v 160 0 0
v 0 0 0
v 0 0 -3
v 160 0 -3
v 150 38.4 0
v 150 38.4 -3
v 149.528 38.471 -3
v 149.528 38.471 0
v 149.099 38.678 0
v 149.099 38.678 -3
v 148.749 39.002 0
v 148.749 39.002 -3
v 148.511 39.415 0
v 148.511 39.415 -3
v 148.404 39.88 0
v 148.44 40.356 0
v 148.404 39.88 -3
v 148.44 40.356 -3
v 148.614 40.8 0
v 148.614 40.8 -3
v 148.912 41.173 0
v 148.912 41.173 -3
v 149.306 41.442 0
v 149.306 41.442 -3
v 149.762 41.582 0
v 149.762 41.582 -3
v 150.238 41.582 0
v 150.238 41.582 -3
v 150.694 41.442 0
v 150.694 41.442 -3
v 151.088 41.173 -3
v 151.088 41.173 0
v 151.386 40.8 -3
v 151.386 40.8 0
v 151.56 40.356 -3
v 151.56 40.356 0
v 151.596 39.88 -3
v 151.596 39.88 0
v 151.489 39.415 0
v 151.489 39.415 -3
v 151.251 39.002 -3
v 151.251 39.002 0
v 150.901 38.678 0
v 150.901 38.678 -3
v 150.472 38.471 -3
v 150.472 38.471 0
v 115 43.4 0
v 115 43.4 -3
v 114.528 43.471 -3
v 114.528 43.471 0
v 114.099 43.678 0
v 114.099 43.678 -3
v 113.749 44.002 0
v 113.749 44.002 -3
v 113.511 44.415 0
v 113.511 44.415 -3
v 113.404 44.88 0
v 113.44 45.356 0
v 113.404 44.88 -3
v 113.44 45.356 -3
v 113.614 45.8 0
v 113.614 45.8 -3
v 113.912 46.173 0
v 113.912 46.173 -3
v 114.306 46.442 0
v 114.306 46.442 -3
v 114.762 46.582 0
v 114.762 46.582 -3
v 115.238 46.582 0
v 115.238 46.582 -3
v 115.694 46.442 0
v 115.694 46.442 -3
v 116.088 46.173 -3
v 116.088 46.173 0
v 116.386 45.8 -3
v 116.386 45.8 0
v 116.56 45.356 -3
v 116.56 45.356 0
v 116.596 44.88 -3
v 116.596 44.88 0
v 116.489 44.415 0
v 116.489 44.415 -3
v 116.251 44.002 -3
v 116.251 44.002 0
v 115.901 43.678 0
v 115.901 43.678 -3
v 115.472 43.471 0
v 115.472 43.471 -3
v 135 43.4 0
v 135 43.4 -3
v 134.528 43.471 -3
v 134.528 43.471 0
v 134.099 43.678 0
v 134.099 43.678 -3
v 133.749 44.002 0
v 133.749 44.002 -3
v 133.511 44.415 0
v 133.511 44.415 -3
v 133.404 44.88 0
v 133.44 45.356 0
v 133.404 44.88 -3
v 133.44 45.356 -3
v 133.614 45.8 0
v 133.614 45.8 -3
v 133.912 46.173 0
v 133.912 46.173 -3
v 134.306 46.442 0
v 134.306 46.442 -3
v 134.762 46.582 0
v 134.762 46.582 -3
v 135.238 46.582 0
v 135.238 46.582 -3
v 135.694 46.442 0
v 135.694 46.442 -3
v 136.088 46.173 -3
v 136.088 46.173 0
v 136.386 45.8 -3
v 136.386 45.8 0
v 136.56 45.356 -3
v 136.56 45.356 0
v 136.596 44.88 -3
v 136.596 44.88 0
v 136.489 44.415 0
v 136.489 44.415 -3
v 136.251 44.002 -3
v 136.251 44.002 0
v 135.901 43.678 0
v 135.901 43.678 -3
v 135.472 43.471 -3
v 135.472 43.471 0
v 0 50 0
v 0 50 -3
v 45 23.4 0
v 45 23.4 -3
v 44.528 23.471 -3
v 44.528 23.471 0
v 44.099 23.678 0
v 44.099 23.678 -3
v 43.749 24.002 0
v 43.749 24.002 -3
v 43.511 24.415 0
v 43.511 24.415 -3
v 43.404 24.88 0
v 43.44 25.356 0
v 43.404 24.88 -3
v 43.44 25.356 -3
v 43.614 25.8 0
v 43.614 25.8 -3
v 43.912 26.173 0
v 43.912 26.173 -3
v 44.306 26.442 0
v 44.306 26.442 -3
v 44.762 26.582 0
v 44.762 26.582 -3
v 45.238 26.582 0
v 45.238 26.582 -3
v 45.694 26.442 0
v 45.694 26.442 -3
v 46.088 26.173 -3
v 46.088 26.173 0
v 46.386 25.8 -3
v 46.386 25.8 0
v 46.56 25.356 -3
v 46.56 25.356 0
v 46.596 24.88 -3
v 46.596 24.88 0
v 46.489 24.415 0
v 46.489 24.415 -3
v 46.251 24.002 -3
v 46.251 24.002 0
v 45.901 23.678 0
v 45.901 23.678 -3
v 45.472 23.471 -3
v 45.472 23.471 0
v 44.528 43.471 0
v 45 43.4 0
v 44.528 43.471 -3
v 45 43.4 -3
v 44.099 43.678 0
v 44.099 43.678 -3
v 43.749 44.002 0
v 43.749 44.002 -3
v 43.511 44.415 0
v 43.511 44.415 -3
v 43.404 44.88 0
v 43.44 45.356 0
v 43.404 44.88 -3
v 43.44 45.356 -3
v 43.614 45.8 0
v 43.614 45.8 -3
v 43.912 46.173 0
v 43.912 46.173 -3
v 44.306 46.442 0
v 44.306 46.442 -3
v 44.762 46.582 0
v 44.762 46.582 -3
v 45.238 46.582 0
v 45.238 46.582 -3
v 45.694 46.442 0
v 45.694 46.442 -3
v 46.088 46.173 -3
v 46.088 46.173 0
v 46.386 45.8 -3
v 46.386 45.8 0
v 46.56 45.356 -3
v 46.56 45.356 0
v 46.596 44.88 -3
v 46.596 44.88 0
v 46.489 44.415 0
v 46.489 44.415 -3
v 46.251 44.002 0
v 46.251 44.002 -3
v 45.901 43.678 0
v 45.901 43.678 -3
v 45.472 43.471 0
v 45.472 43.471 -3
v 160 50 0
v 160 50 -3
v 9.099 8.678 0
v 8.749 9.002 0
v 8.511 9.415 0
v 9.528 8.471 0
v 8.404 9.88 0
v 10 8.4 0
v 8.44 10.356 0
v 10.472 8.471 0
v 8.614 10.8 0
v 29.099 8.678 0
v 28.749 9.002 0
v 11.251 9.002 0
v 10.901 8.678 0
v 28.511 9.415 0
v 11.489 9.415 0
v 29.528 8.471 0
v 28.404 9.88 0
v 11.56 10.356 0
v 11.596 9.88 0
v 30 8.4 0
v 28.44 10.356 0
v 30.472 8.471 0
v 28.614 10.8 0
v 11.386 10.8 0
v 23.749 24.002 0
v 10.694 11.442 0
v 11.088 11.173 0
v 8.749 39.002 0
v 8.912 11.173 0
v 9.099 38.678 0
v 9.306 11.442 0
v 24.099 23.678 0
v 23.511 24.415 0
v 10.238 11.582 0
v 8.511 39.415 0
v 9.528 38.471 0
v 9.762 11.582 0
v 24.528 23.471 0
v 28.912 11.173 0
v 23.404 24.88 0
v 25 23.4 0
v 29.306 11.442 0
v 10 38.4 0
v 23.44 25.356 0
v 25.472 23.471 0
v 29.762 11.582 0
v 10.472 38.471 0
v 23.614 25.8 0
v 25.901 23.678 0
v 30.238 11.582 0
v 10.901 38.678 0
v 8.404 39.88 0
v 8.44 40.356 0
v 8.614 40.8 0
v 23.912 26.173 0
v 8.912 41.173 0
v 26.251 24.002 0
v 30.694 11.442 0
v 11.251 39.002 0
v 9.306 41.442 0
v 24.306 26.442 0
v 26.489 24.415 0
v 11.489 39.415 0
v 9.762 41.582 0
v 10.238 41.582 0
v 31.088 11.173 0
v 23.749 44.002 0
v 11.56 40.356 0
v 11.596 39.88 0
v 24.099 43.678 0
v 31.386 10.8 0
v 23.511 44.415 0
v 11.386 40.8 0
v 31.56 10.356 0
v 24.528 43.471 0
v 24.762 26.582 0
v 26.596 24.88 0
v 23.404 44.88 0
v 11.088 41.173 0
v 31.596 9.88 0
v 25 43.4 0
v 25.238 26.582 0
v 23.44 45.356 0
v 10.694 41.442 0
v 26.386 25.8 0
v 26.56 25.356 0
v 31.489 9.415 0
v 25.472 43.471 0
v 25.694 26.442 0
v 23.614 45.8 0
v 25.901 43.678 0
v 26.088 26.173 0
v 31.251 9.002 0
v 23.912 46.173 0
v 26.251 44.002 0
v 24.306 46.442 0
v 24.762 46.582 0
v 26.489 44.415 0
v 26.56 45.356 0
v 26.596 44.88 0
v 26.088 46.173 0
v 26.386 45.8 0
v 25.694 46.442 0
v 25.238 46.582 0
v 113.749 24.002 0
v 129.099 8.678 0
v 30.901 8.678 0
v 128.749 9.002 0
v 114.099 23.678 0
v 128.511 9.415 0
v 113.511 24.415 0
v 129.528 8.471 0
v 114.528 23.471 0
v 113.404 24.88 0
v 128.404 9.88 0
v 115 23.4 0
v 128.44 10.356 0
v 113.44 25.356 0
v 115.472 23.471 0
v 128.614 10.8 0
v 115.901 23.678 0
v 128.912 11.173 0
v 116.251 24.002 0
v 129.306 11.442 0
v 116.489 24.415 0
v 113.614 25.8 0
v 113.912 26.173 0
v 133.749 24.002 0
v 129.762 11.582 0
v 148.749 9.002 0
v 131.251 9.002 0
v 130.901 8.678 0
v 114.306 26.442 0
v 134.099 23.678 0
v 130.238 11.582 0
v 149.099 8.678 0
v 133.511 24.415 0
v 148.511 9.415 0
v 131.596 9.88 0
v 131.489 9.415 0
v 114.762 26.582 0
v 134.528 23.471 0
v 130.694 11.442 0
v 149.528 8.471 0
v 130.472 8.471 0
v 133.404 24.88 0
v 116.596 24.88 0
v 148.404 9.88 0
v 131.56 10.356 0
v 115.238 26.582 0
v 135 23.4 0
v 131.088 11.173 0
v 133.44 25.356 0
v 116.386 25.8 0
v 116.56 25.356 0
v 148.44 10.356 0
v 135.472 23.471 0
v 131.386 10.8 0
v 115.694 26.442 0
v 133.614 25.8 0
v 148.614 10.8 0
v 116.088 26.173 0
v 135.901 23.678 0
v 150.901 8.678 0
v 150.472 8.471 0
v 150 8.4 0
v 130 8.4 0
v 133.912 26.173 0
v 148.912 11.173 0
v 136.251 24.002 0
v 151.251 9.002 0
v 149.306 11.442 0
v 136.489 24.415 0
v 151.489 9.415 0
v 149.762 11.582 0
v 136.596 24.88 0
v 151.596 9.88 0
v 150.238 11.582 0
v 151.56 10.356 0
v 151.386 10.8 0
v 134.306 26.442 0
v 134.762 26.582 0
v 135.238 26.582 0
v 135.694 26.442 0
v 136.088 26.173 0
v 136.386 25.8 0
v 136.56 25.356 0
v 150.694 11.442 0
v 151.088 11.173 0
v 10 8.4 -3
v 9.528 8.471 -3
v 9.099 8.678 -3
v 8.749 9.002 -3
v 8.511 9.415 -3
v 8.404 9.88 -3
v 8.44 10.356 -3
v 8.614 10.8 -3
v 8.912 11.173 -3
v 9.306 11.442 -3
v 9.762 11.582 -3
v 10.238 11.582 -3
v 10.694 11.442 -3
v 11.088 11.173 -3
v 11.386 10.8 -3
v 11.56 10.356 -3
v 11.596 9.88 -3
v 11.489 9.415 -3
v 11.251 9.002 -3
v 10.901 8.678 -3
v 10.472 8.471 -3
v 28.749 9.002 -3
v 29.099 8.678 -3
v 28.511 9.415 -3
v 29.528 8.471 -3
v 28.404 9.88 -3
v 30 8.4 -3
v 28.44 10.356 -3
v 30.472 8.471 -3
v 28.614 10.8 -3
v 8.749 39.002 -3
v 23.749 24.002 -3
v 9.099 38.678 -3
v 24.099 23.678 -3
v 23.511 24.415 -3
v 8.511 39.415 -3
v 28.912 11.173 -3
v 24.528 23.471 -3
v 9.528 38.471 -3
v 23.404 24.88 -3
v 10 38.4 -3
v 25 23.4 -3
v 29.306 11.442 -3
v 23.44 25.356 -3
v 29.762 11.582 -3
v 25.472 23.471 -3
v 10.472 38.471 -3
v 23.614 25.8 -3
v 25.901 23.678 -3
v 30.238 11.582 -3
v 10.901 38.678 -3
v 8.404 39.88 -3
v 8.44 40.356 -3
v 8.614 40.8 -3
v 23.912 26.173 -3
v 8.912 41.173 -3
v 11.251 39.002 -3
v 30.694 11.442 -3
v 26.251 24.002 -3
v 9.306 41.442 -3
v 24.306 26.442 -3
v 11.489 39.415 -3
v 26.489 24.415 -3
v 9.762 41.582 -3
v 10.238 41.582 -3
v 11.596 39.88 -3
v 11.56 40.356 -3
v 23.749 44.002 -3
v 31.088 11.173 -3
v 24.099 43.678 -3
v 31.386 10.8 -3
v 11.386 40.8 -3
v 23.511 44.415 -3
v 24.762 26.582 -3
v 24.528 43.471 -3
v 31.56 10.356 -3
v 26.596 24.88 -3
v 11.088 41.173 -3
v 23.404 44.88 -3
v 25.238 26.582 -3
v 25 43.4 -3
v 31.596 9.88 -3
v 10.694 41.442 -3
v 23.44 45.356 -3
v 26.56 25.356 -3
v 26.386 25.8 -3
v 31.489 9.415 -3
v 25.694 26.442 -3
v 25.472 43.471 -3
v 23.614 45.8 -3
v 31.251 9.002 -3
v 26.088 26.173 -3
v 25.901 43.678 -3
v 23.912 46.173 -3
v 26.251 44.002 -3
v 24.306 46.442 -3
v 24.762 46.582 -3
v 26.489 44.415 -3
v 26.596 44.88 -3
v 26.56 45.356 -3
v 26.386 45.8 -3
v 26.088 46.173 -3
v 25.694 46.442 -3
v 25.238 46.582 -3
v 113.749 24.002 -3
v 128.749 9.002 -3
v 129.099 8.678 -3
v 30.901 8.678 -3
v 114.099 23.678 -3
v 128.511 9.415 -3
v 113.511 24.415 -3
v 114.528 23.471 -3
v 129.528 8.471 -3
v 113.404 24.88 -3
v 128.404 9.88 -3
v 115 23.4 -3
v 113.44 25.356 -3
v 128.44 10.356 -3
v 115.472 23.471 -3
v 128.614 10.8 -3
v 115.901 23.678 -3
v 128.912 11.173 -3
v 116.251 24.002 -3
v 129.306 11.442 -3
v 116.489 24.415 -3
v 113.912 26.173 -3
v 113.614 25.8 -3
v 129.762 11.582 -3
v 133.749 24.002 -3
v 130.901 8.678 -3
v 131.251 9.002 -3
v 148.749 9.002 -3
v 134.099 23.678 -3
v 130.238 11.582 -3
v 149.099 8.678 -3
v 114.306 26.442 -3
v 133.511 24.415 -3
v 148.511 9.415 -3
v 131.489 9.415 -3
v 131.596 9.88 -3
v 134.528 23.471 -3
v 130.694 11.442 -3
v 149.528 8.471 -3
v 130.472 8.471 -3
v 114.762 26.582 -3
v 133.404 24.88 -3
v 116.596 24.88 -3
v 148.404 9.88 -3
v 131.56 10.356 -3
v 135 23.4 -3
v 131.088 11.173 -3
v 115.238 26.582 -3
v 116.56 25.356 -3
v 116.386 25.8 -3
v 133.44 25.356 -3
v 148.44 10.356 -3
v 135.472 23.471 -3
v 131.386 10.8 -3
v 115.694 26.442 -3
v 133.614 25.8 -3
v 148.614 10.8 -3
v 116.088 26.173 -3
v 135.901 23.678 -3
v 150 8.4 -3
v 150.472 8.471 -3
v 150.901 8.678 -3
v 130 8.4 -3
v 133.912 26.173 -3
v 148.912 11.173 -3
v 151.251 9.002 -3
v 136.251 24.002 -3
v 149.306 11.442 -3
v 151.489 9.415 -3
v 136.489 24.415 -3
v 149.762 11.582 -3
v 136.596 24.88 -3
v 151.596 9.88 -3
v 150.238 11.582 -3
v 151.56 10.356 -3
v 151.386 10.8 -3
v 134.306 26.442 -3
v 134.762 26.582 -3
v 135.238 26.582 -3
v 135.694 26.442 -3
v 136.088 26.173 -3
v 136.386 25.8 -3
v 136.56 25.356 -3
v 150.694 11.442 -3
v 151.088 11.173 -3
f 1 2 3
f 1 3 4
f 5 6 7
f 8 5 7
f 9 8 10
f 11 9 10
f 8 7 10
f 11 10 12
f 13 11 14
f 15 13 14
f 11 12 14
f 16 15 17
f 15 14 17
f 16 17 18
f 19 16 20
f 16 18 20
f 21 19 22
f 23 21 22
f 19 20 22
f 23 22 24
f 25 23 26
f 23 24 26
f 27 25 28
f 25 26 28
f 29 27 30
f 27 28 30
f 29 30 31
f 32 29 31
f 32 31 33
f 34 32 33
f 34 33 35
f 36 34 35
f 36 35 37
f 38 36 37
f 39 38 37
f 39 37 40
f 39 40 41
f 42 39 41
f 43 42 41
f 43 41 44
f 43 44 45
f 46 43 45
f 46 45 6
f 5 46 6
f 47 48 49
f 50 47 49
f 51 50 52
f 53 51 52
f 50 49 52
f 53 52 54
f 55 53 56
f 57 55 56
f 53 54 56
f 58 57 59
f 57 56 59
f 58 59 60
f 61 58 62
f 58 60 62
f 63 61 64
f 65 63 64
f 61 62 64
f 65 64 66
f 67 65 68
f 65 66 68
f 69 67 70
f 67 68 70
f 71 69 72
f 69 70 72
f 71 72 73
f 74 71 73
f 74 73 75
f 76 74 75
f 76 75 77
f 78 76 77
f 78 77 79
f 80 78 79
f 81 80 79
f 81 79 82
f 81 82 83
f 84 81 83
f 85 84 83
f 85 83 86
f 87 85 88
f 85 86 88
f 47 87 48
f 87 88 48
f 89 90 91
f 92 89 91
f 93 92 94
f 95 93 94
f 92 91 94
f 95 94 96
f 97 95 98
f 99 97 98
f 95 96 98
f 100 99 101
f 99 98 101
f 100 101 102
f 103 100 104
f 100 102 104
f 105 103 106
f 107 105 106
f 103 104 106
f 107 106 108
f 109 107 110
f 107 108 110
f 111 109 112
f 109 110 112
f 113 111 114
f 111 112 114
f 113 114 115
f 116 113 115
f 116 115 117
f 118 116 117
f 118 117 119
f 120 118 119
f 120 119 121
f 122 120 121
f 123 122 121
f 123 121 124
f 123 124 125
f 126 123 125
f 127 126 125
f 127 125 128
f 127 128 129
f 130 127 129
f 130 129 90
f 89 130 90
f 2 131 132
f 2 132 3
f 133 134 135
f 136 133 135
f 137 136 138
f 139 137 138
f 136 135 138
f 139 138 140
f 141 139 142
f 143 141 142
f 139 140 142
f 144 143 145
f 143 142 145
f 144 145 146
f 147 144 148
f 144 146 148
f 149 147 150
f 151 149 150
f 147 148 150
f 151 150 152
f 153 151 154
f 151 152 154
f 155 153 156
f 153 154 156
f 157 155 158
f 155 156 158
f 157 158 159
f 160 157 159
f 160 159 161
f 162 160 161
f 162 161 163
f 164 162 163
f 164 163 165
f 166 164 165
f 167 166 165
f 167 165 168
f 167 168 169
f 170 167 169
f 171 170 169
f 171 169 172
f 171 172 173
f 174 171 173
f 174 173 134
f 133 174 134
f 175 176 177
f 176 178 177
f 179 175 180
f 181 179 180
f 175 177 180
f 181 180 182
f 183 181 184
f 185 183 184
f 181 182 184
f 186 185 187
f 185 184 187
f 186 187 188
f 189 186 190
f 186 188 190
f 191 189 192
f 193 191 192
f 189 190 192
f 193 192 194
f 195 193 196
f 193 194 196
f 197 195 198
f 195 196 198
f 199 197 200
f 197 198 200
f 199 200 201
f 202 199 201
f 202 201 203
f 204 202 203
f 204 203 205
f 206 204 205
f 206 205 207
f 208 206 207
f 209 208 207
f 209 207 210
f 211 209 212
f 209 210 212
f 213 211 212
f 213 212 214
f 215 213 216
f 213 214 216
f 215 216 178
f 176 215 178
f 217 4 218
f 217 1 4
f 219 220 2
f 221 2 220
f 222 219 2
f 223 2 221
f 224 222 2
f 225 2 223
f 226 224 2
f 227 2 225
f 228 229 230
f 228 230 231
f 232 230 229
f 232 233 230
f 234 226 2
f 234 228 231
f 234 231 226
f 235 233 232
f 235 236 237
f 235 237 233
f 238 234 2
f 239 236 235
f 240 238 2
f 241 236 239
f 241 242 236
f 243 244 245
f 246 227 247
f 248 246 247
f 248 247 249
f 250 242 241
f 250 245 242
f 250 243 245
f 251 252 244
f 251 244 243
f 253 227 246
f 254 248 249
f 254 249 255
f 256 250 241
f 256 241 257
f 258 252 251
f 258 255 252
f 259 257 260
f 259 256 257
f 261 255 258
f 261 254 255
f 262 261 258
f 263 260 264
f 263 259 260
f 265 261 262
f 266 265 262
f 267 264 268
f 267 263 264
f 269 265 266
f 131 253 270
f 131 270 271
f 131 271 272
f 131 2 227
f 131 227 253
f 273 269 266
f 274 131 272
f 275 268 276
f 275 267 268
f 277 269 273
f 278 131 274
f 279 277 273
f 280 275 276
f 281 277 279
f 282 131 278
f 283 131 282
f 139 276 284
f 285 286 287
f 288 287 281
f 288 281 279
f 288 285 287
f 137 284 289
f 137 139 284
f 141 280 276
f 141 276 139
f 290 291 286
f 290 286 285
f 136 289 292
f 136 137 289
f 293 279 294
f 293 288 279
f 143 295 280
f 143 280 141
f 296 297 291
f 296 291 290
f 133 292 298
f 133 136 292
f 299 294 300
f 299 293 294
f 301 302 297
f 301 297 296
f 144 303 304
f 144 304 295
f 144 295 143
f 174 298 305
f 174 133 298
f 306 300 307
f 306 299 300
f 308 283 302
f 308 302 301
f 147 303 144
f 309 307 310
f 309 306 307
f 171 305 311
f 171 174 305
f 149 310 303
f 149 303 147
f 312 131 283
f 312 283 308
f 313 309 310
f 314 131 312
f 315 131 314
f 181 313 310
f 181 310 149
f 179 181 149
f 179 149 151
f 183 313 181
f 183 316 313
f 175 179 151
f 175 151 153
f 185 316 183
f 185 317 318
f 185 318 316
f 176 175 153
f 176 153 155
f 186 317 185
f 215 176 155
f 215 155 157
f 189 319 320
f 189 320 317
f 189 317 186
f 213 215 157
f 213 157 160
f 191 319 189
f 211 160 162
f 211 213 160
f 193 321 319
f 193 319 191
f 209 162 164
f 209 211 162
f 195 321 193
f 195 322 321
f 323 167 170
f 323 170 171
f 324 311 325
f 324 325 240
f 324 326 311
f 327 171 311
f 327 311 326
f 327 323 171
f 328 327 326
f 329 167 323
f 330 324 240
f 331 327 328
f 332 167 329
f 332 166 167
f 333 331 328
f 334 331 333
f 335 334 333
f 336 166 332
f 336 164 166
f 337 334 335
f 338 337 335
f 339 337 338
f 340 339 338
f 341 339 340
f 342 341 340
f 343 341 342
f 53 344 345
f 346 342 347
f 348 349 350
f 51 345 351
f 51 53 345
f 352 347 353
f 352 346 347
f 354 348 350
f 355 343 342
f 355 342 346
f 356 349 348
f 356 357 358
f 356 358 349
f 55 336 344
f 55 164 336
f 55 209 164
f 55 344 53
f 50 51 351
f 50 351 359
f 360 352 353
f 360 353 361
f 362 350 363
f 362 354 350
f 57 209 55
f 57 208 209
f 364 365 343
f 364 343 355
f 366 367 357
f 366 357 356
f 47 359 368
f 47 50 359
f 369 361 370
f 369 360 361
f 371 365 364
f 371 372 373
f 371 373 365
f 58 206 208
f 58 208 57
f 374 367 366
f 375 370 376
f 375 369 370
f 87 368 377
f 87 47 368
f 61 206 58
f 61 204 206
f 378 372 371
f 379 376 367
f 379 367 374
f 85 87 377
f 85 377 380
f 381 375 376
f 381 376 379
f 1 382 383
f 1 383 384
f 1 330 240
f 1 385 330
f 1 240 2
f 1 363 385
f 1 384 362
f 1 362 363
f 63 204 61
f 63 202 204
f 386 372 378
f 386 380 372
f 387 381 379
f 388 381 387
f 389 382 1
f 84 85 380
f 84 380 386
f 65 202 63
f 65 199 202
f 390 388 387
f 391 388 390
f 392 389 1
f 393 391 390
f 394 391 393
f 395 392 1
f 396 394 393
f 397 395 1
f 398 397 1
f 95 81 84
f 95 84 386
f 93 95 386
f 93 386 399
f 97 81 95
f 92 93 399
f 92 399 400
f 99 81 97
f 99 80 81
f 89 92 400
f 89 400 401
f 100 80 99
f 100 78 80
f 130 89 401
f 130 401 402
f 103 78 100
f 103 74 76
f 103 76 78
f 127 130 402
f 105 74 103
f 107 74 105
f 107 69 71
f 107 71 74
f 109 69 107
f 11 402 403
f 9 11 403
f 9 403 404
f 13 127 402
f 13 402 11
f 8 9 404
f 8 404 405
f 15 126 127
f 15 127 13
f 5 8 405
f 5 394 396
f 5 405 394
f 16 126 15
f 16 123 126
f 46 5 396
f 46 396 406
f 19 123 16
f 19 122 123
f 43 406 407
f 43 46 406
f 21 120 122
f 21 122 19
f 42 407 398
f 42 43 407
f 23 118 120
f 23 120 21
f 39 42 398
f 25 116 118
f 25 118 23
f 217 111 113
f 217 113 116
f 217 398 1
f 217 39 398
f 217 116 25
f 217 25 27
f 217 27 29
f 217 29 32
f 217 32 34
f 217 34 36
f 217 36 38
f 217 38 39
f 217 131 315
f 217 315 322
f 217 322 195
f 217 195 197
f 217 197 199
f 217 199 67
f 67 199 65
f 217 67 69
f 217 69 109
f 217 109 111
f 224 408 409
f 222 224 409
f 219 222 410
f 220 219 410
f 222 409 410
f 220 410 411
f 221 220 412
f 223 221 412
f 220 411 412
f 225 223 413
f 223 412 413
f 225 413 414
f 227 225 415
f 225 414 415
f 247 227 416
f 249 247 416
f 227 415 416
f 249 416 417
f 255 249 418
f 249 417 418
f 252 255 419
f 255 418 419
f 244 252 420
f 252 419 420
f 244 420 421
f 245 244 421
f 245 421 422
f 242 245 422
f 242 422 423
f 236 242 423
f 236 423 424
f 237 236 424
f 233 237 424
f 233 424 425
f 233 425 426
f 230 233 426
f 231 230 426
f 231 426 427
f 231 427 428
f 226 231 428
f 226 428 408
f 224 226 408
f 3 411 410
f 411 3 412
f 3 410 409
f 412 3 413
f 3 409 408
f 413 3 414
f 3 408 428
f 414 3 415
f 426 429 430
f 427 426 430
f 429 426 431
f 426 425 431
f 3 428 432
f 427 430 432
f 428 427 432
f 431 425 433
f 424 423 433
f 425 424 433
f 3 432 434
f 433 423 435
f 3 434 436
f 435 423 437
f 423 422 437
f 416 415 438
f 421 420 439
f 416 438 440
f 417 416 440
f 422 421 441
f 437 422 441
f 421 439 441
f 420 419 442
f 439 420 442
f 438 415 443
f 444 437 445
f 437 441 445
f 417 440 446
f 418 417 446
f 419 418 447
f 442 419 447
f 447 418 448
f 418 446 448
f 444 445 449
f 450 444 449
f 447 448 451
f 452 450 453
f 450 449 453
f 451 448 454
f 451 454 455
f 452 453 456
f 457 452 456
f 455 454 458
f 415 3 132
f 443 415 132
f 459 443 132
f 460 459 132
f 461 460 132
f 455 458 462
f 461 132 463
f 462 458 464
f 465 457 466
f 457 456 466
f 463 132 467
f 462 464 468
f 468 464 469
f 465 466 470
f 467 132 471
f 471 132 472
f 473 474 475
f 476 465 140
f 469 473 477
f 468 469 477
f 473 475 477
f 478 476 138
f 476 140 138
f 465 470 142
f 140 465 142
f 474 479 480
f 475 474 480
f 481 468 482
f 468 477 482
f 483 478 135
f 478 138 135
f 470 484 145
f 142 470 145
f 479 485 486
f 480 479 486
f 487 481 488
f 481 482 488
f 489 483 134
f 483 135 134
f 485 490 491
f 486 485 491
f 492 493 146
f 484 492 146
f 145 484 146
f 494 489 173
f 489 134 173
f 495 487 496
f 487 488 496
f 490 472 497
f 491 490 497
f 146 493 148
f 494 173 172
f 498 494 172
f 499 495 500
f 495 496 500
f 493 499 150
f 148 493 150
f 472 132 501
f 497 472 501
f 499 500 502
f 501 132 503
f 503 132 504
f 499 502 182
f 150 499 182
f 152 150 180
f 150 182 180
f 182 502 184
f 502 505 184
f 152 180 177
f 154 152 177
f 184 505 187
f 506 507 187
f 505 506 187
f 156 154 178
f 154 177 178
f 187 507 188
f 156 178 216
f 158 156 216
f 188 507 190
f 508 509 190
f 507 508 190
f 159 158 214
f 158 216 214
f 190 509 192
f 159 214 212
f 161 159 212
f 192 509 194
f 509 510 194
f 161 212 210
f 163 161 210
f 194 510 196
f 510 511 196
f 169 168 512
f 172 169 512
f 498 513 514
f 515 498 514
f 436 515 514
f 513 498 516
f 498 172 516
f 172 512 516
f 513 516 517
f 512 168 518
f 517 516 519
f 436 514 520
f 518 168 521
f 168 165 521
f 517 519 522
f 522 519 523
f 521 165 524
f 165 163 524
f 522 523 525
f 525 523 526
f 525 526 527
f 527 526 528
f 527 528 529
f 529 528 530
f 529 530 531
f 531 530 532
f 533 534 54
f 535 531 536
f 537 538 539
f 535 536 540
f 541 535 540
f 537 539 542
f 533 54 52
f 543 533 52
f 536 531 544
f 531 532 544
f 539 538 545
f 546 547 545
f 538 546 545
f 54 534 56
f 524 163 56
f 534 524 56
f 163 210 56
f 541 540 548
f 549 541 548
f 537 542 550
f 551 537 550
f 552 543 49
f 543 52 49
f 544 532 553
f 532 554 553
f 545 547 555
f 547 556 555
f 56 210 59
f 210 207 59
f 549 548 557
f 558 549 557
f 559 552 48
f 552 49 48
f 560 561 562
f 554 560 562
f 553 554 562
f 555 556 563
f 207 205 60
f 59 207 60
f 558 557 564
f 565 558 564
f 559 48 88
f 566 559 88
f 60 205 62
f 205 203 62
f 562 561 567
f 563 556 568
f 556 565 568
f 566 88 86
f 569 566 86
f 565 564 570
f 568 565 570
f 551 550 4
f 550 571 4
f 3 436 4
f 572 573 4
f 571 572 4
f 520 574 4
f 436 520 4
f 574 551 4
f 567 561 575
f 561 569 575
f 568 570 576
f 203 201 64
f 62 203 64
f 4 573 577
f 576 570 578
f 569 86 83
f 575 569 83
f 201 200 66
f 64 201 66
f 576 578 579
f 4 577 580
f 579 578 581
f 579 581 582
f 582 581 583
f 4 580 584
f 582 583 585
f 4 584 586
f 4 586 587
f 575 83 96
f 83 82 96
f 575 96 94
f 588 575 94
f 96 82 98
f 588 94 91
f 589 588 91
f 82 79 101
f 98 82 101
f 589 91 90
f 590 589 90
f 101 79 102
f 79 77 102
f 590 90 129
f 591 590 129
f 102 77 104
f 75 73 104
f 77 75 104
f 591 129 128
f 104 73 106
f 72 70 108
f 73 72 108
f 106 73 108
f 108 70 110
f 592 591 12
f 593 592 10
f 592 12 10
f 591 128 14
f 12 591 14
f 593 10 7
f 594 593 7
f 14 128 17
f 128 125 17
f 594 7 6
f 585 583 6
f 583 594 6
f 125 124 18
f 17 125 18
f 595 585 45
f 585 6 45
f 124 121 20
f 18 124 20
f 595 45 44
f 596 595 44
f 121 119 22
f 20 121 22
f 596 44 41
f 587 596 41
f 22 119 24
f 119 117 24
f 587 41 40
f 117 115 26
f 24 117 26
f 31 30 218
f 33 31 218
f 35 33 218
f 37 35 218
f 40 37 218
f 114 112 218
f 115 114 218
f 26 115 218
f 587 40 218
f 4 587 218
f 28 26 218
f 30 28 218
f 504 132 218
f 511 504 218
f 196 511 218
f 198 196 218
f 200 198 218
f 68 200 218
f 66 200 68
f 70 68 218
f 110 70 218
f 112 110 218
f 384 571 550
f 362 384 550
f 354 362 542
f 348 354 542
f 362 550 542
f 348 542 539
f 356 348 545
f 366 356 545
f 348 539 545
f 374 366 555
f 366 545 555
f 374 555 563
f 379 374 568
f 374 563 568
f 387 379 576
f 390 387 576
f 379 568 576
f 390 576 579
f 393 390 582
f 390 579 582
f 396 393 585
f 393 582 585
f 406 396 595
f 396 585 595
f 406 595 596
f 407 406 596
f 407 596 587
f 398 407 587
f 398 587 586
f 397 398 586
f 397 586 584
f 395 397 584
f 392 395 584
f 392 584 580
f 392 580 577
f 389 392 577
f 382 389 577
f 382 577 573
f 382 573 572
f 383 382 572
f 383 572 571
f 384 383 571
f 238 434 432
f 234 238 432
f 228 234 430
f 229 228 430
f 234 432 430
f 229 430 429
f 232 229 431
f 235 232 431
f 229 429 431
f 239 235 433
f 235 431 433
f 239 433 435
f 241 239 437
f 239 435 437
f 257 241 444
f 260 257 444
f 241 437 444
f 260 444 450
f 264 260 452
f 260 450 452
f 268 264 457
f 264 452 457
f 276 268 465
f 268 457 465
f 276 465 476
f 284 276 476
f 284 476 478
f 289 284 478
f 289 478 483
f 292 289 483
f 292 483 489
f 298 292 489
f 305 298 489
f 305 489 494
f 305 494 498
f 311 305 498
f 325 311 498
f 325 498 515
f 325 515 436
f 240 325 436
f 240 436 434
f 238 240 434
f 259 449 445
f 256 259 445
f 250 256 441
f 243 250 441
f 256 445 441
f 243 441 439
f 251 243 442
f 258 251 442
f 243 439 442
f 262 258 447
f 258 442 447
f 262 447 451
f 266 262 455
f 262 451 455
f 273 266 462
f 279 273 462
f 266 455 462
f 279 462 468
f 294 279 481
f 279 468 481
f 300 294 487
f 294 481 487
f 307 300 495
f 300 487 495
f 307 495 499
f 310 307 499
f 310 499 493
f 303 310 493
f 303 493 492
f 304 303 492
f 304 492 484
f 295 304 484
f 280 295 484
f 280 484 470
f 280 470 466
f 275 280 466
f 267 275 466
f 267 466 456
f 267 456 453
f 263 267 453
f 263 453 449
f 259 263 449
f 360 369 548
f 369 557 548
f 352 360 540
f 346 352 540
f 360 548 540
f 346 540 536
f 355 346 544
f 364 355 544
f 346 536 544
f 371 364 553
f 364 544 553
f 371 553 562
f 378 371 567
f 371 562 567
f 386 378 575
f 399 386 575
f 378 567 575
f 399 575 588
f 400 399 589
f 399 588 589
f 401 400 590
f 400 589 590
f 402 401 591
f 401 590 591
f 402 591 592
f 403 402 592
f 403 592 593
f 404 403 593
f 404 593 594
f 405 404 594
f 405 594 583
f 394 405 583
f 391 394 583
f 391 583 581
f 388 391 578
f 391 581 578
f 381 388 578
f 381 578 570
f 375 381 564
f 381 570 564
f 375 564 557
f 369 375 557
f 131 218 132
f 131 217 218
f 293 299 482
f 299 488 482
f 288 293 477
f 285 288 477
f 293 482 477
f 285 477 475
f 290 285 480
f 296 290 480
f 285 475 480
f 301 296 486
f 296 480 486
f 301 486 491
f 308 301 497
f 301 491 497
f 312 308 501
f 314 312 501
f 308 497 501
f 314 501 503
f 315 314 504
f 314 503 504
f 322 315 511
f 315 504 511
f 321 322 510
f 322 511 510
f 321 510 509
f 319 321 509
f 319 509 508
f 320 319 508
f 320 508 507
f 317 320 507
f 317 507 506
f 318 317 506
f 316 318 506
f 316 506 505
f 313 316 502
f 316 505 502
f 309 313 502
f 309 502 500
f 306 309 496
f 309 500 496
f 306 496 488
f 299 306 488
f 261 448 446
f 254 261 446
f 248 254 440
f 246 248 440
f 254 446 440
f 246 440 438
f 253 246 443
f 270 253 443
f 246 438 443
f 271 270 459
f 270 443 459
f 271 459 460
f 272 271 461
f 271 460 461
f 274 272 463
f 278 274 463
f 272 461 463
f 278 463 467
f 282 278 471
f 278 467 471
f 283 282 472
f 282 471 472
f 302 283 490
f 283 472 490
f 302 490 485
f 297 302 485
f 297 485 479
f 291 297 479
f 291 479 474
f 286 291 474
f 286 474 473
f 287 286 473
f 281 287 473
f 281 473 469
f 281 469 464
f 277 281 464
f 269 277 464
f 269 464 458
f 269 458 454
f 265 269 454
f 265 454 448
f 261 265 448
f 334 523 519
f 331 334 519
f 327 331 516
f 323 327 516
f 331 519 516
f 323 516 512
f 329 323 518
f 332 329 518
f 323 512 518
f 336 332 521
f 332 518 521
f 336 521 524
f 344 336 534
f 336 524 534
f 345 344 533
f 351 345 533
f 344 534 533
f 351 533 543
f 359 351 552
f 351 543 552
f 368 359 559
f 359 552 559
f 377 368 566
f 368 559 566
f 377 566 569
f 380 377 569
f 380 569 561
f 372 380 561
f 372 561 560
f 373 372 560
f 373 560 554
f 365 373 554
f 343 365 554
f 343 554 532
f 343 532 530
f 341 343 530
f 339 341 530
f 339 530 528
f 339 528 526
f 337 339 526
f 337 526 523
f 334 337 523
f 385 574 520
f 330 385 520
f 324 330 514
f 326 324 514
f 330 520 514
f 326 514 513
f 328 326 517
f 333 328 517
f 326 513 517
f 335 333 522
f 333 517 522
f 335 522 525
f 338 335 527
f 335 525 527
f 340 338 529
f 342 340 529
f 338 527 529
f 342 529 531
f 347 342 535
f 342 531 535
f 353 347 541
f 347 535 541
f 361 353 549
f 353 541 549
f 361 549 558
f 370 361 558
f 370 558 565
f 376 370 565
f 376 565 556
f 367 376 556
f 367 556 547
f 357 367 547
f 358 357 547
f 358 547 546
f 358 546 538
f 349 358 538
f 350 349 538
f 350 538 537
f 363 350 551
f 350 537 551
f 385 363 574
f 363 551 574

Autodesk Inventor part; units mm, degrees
ref_plane "YZ Plane" through (0, 0, 0) normal (1, 0, 0) x (0, 1, 0)
ref_plane "XZ Plane" through (0, 0, 0) normal (0, 1, 0) x (-1, 0, 0)
ref_plane "XY Plane" through (0, 0, 0) normal (0, 0, 1) x (1, 0, 0)
sketch "スケッチ1" plane through (0, 0, 0) normal (0, 0, 1) x (1, 0, 0)
  line L0 (0, 0) -> (160, 0)
  line L1 (160, 0) -> (160, 50)
  line L2 (160, 50) -> (0, 50)
  line L3 (0, 50) -> (0, 0)
  dimension "d0" = 160
  dimension "d1" = 50
extrude "押し出し1" add sketch "スケッチ1" against normal blind 3
sketch "スケッチ2" plane through (0, 0, 0) normal (0, 0, 1) x (1, 0, 0)
  line L0 (160, 50) -> (0, 50) projected
  line L1 (160, 0) -> (160, 50) projected
  line L2 (0, 50) -> (0, 0) projected
  line L3 (0, 0) -> (160, 0) projected
  point P0 (135, 45)
  point P1 (135, 25)
  point P2 (25, 45)
  point P3 (25, 25)
  point P4 (115, 45)
  point P5 (115, 25)
  point P6 (45, 45)
  point P7 (45, 25)
  point P8 (150, 40)
  point P9 (150, 10)
  point P10 (10, 40)
  point P11 (10, 10)
  dimension "d4" = 5
  dimension "d5" = 25
  dimension "d6" = 20
  dimension "d7" = 5
  dimension "d8" = 25
  dimension "d9" = 20
  dimension "d10" = 20
  dimension "d11" = 20
  dimension "d12" = 10
  dimension "d13" = 10
  dimension "d14" = 10
  dimension "d15" = 10
  dimension "d16" = 20
  dimension "d17" = 5
  dimension "d18" = 5
  dimension "d19" = 20
hole "穴1" at (135, 45, 0) at (135, 25, 0) at (25, 45, 0) at (25, 25, 0) at (115, 45, 0) at (115, 25, 0) at (45, 45, 0) at (45, 25, 0) at (150, 40, 0) at (150, 10, 0) at (10, 40, 0) at (10, 10, 0) direction (0, 0, -1) diameter 3.2 end through all
sketch "スケッチ3" plane through (0, 0, 0) normal (0, 0, 1) x (1, 0, 0)
  line L0 (0, 0) -> (160, 0) projected
  line L1 (0, 50) -> (0, 0) projected
  line L2 (160, 0) -> (160, 50) projected
  point P0 (30, 10)
  point P1 (130, 10)
  dimension "d27" = 10
  dimension "d28" = 30
  dimension "d29" = 10
  dimension "d30" = 30
hole "穴2" at (30, 10, 0) at (130, 10, 0) direction (0, 0, -1) diameter 3.2 end through all
properties part number "frontPlate" material "アルミニウム 6061"
